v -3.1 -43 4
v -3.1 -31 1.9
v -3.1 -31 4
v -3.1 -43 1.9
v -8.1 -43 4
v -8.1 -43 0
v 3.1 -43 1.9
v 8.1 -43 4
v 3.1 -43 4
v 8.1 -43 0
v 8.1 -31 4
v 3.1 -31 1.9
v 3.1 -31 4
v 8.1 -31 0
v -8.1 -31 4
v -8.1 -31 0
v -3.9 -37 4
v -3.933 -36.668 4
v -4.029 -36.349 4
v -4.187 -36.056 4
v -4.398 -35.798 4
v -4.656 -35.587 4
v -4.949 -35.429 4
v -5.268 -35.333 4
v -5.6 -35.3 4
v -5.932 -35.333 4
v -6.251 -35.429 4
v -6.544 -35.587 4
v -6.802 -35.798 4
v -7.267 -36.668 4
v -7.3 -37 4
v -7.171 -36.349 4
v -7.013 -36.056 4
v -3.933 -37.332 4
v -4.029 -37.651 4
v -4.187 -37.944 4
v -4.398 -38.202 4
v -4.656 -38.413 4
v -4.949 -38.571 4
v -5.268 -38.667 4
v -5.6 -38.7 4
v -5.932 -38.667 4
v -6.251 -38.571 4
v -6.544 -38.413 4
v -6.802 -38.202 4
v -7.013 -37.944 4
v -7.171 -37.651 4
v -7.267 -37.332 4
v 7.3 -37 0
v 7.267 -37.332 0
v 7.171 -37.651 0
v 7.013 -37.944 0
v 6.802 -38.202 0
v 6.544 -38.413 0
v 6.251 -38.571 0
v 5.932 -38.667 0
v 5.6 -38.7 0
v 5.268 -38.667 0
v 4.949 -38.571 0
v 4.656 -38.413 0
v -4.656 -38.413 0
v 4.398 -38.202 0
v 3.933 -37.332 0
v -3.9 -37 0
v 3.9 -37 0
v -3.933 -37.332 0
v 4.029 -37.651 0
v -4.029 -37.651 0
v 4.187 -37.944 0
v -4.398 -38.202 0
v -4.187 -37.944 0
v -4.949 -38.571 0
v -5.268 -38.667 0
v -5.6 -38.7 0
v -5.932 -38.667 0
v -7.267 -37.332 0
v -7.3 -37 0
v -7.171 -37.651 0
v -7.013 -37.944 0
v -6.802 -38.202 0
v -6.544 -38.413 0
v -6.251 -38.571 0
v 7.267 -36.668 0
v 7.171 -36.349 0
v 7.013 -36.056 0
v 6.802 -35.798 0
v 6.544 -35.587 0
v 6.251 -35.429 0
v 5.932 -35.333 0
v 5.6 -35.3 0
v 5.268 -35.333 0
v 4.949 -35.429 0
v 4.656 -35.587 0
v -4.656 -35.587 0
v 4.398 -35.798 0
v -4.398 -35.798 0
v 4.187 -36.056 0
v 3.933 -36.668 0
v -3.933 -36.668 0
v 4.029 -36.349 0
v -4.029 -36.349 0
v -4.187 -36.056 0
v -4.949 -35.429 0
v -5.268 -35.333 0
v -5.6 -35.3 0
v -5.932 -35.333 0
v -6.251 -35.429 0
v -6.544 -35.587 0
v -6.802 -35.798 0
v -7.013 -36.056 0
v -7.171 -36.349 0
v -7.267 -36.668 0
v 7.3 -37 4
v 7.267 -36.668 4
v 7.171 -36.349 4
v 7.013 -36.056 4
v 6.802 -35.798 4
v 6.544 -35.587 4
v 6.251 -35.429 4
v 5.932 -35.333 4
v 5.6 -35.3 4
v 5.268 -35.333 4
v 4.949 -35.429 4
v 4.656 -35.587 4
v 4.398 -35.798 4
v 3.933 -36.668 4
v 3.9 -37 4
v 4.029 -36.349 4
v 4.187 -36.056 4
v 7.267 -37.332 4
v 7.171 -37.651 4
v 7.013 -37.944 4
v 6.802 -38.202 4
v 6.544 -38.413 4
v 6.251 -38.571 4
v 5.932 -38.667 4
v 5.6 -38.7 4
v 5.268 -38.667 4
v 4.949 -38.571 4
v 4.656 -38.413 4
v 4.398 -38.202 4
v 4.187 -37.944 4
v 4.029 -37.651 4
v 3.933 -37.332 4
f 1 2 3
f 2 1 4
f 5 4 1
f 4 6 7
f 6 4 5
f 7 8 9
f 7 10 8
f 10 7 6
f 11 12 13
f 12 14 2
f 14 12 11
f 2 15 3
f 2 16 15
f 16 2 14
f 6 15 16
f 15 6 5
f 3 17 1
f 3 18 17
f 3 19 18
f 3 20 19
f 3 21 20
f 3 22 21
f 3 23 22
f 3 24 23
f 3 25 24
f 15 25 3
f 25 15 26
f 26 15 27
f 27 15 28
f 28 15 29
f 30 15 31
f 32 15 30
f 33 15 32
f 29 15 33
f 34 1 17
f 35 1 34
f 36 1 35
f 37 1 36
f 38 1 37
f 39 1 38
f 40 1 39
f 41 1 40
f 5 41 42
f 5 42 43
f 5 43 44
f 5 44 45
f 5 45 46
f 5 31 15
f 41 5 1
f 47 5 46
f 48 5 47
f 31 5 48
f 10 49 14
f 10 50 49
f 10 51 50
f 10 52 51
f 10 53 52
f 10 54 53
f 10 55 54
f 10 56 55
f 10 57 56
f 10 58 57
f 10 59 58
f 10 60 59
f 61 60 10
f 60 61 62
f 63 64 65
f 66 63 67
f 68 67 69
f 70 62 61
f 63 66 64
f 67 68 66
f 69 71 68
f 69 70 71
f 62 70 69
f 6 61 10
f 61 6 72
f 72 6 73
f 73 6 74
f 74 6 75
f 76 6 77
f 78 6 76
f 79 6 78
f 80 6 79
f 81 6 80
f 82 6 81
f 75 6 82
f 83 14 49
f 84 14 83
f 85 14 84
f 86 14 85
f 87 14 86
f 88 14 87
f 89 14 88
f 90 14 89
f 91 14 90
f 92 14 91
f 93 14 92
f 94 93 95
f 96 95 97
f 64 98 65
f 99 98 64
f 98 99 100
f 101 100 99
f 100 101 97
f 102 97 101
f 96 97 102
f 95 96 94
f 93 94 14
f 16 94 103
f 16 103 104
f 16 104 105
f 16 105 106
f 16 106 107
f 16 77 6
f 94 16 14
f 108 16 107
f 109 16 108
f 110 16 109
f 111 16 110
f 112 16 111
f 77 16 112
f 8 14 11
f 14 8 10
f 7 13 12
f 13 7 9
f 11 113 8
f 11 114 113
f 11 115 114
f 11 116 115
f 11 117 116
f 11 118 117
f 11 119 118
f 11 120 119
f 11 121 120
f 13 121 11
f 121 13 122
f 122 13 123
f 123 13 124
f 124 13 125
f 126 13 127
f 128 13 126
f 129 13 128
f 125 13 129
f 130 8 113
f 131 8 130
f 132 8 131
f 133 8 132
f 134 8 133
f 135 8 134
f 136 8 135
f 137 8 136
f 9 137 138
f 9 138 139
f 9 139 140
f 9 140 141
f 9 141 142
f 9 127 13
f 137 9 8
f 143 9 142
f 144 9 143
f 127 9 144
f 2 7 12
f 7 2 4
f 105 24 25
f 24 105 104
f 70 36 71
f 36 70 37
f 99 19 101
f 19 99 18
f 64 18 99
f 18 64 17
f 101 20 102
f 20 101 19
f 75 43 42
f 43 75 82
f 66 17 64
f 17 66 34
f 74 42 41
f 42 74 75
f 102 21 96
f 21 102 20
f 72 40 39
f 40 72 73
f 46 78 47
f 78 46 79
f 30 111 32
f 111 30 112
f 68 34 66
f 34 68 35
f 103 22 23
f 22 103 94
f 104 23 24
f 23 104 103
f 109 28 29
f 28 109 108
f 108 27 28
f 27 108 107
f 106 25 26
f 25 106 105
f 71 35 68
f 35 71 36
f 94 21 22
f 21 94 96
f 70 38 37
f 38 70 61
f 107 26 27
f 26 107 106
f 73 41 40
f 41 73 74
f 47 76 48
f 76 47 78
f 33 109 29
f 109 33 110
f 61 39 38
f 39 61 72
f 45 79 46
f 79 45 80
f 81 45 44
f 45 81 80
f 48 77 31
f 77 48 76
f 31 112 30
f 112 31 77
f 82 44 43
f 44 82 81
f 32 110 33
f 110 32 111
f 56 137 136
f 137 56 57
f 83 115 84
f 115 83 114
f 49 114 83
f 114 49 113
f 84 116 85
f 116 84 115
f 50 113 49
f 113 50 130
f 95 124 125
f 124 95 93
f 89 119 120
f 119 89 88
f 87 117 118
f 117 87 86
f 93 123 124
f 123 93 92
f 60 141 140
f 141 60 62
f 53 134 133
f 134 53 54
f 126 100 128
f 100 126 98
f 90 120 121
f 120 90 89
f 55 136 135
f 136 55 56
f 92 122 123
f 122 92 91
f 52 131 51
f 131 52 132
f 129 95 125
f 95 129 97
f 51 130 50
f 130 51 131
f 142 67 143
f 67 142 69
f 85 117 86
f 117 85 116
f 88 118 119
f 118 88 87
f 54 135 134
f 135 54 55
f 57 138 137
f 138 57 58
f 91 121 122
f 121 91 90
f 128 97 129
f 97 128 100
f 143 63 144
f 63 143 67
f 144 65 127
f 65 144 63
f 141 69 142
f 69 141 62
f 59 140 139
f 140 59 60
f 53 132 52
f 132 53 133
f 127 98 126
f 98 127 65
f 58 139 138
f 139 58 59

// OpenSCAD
// file: ../port_tower.scad
// ============================================================
//  Female port tower: positioning stage (rotated 180 deg so its
//  payload face looks toward -Y) + bracket plate with the keyed
//  D-hole. The bulkhead goes in from the back (flange behind the
//  plate), nut on the front. Plate front face is at world y=0.
// ============================================================
include <stage.scad>

bracket_w      = 36;
bracket_hole_dz = port_z - stage_payload_z;   // hole above payload centre
bracket_bot    = -zs_h / 2;
bracket_top    = bracket_hole_dz + bh_nut_af / cos(30) / 2 + 3;
rib_t          = 5;     // rib width (X)
rib_d          = 7;     // rib depth (out of the plate front)

// Payload-face coordinates: origin at face centre, +Y away from the stage.
module port_bracket() {
    difference() {
        union() {
            translate([-bracket_w / 2, 0, bracket_bot]) cube([bracket_w, plate_t, bracket_top - bracket_bot]);
            // stiffening ribs, outboard of the nut and clear of the plug clamp
            for (sx = [-1, 1])
                translate([sx > 0 ? bracket_w / 2 - rib_t : -bracket_w / 2, plate_t - 0.01, bracket_bot])
                    hull() {
                        cube([rib_t, rib_d, 1]);
                        translate([0, 0, bracket_hole_dz - 14]) cube([rib_t, 0.01, 1]);
                    }
        }
        // keyed D-hole, flat on top
        translate([0, plate_t, bracket_hole_dz]) rotate([90, 0, 0]) d_hole(t = plate_t);
        // mounting screws into the z-slider's captive nuts
        for (p = payload_pts) translate([p[0], -0.01, p[1]]) rotate([-90, 0, 0]) {
            screw_hole(m3_d, plate_t + rib_d);
        }
    }
}

// Whole tower in world coordinates at fine-travel offset (dx, dz),
// measured in world X / Z.
// Tower B (i=1) is the mirror image so its X adjust screw faces outward.
module port_tower_world(i, dx = 0, dz = 0) {
    ldx = i == 0 ? -dx : dx;   // world dx -> stage-local dx
    translate([tower_x(i), tower_y, 0]) rotate([0, 0, 180]) stage_hand(i == 1) {
        stage_assembly(ldx, dz, base = false); // base is part of the X base
        stage_payload_origin(ldx, dz) show("port_bracket") color("Orange") port_bracket();
    }
}

// Bulkhead connector stand-in (for checks / preview), world coords.
module bulkhead_world(i, dx = 0, dz = 0) {
    translate([port_x[i] + dx, port_face_y, port_z + dz]) rotate([90, 0, 0]) show("bulkhead") color("DimGray") {
        cylinder(d = bh_thread_d, h = bh_thread_len - plate_t);                   // thread + face
        cylinder(d = bh_nut_af / cos(30), h = bh_nut_t, $fn = 6);                  // nut
        translate([0, 0, -plate_t - 2]) cylinder(d = bh_flange_d, h = 2);          // flange
        translate([0, 0, -plate_t - 40]) cylinder(d = 14, h = 38);                 // body
    }
}

echo("CHECK", "port_z", port_z);
// file: ../plug_mount.scad
// ============================================================
//  Male plug mount: flexure (frame + 4 L-beams + floating island with
//  the clamp cradle built in), clamp cap, and two identical stop
//  straps (front + back) whose pins limit X/Z float to +/-flex_float
//  and whose 1 mm standoff limits Y float to +/-flex_stop_gap.
//  Local coords: origin at the stage payload face centre, +Y away from
//  the stage, Z relative to the payload centre.
// ============================================================
include <port_tower.scad>
include <axes.scad>

plug_dz = port_z - (yc_top + stage_payload_z); // plug centre above payload centre
blk_x = plug_bx / 2 + 0.1; // snug in X
blk_y0 = flex_t + clamp_wall; // block back face
blk_y1 = blk_y0 + plug_by; // block front face
blk_z0 = plug_dz + plug_drop; // block bottom
blk_z1 = blk_z0 + plug_block[2];
crad_x = blk_x + 5; // cradle half width
crad_y1 = blk_y1 - 0.4; // cradle stops short: cap clamps the block
cap_back_y = crad_y1;
crad_scr = blk_x + 2.5; // cradle screw X
lip_in = plug_bx / 2 - 0.45; // top lips overlap the block by 0.55 mm
relief_hole_d = 7; // through the lips, centred on the cable

isl_x = 19; // island half width
isl_z0 = blk_z0 - 1;
isl_z1 = isl_z0 + flex_isl_h;
flex_g = 6; // island-to-frame gap
in_x = isl_x + flex_g;
in_z0 = isl_z0 - flex_g;
in_z1 = isl_z1 + flex_g;
fr_bar = 5;
fr_x = in_x + fr_bar;
fr_z0 = -zs_h / 2;
fr_z1 = in_z1 + fr_bar;

pin_d = 4;
pin_z = isl_z1 - 4;
pin_hole = pin_d + 2 * flex_float;
strap_w = 8;
strap_t = 3;
strap_foot_w = 18;
strap_z0 = pin_z - 4;
strap_scr = [-5, 5]; // strap screw X (through the top bar)
strap_scr_z = (in_z1 + fr_z1) / 2;

// one L-beam: island bottom face -> down -> outward -> up -> frame side
leg = 3;
function beam_path(sx, sz) =
  let (
    zc = (isl_z0 + isl_z1) / 2,
    zi = sz < 0 ? isl_z0 : isl_z1,
    zh = zi + sz * leg,
    zv = zc + sz * (flex_g - 2 + 0.5),
    xv = sx * (isl_x + leg)
  ) [[sx * 10, zi], [sx * 10, zh], [xv, zh], [xv, zv], [sx * in_x, zv]];

module poly_beam(pts, w) {
  for (k = [0:len(pts) - 2])
    hull() {
      translate(pts[k]) square(w, center=true);
      translate(pts[k + 1]) square(w, center=true);
    }
}

// XZ outline helpers: 2D (x, z) extruded along +Y from y0, thickness t
module xz_extrude(y0, t, convexity=4) { translate([0, y0 + t, 0]) rotate([90, 0, 0]) linear_extrude(height=t, convexity=convexity) children(); }

module plug_flexure() {
  difference() {
    union() {
      xz_extrude(0, flex_t) {
        difference() {
          translate([-fr_x, fr_z0]) square([2 * fr_x, fr_z1 - fr_z0]);
          translate([-in_x, in_z0]) square([2 * in_x, in_z1 - in_z0]);
        }
        translate([-isl_x, isl_z0]) square([2 * isl_x, isl_z1 - isl_z0]);
        for (sx = [-1, 1], sz = [-1, 1]) poly_beam(beam_path(sx, sz), flex_beam_w);
      }
      // clamp cradle on the island front: back wall + side walls
      translate([-crad_x, flex_t - 0.01, blk_z0]) cube([2 * crad_x, clamp_wall + 0.01, plug_block[2]]);
      for (sx = [-1, 1])
        translate([sx > 0 ? blk_x : -crad_x, blk_y0 - 0.01, blk_z0])
          cube([crad_x - blk_x, crad_y1 - blk_y0 + 0.01, plug_block[2]]);
      // Z retention: lips over the block's top corners, leaving a slot for
      // the cable. Nothing under the block: the plug's bent body hangs below.
      for (sx = [-1, 1])
        translate([sx > 0 ? lip_in : -crad_x, blk_y0 - 0.01, blk_z1])
          cube([crad_x - lip_in, crad_y1 - blk_y0 + 0.01, 1.5]);
    }
    // hole through the top lips for the cable strain relief (the plug goes
    // in from below)
    translate([0, blk_y0 + plug_by / 2, blk_z1 - 0.01]) cylinder(d=relief_hole_d, h=1.5 + 0.02);
    // payload screws into the stage z-slider
    for (p = payload_pts) translate([p[0], -0.5, p[1]]) rotate([-90, 0, 0]) screw_hole(m3_d, flex_t + 1);
    // stop-pin hole (through) and strap screws (through the top bar)
    translate([0, -0.5, pin_z]) rotate([-90, 0, 0]) screw_hole(pin_hole, flex_t + 1);
    for (x = strap_scr) translate([x, -0.5, strap_scr_z]) rotate([-90, 0, 0]) screw_hole(m3_d, flex_t + 1);
    // cap screws, tapped into the cradle side walls
    for (sx = [-1, 1])
      translate([sx * crad_scr, crad_y1 + 0.01, (blk_z0 + blk_z1) / 2])
        rotate([90, 0, 0]) screw_hole(m3_tap, crad_y1 - flex_t + 1);
  }
}

// Clamp cap: 1.5 mm over the block, thicker over the screws.
module plug_clamp_cap() {
  // flat back at the cradle front: squeezes the block (it stands 0.4 proud)
  difference() {
    union() {
      translate([-crad_x, cap_back_y, blk_z0]) cube([2 * crad_x, blk_y1 - cap_back_y + clamp_lip_t, plug_block[2]]);
      for (sx = [-1, 1])
        translate([sx > 0 ? blk_x : -crad_x, cap_back_y, blk_z0])
          cube([crad_x - blk_x, 4, plug_block[2]]);
    }
    for (sx = [-1, 1])
      translate([sx * crad_scr, cap_back_y - 0.01, (blk_z0 + blk_z1) / 2])
        rotate([-90, 0, 0]) screw_hole(m3_d, 5);
  }
}

// Stop strap in its own frame: back face on y=0, pin toward -Y.
module plug_flex_stop() {
  difference() {
    union() {
      translate([-strap_w / 2, 0, strap_z0]) cube([strap_w, strap_t, fr_z1 - strap_z0]);
      translate([-strap_foot_w / 2, -flex_stop_gap, in_z1]) cube([strap_foot_w, strap_t + flex_stop_gap, fr_z1 - in_z1]);
      translate([0, 0.01, pin_z]) rotate([90, 0, 0]) cylinder(d=pin_d, h=flex_stop_gap + 2);
    }
    for (x = strap_scr)
      translate([x, -flex_stop_gap - 0.5, strap_scr_z]) rotate([-90, 0, 0])
          screw_hole(m3_d, strap_t + flex_stop_gap + 1);
  }
}

module plug_flex_stops_placed() {
  translate([0, flex_t + flex_stop_gap, 0]) plug_flex_stop(); // front
  translate([0, -flex_stop_gap, 0]) mirror([0, 1, 0]) plug_flex_stop(); // back
}

// The plug, as separate pieces so a slide-in path can be swept piecewise:
// each piece is hulled with a copy moved by the vector sweep.
module plug_body_pieces(sweep = [0, 0, 0], relief = true) {
  module sw() { hull() { children(); translate(sweep) children(); } }
  sw() translate([-plug_bx / 2, blk_y0, blk_z0]) cube([plug_bx, plug_by, plug_block[2]]);
  if (relief) sw() translate([0, blk_y0 + plug_by / 2, blk_z1]) cylinder(d=plug_cable_d, h=15); // cable strain relief
  sw() hull() {
    translate([-plug_bx / 2, blk_y0, plug_dz - 4]) cube([plug_bx, plug_by, blk_z0 - plug_dz + 4]);
    translate([0, blk_y1 + plug_head_proj - 1, plug_dz]) rotate([-90, 0, 0]) cylinder(d=8, h=1);
  }
}
module plug_body_local() { show("usb_plug") color("White") plug_body_pieces(); }

// Everything that moves with the plug carriage, minus the plug itself.
module plug_mount_world(x_pos, y_pos, dx = 0, dz = 0) {
  o = ms_origin(x_pos, y_pos);
  translate(o) {
    stage_assembly(dx, dz, base = false); // base is part of the Y carriage
    stage_payload_origin(dx, dz) {
      show("plug_flexure") color("Orange") plug_flexure();
      show("plug_clamp_cap") color("Gold") plug_clamp_cap();
      show("plug_flex_stop") color("Khaki") plug_flex_stops_placed();
    }
  }
}
module plug_body_world(x_pos, y_pos, dx = 0, dz = 0) {
  o = ms_origin(x_pos, y_pos);
  translate(o) stage_payload_origin(dx, dz) plug_body_local();
}

// ---- checks ----
echo("CHECK", "clamp_lip_t", clamp_lip_t);
echo("CHECK", "clamp_preload", blk_y1 - cap_back_y);
echo("CHECK", "clamp_x_play", blk_x - plug_bx / 2);
echo("CHECK", "pillar_above_flex", pillar_top - (yc_top + stage_payload_z + fr_z1));
echo("CHECK", "clamp_bottom_above_plug", blk_z0 - plug_dz);
echo("CHECK", "clamp_lip_overlap", blk_x - lip_in);
// lip left over the block in front of / behind the relief hole (Y)
echo("CHECK", "lip_hold_y", (plug_by - relief_hole_d) / 2);
echo(
  "CHECK", "plug_insert_err",
  (ms_origin(0, y_travel)[1] + payload_face_y + blk_y1 + plug_head_proj) - bh_face_y
);
echo("CHECK", "flex_xz_stop", (pin_hole - pin_d) / 2);
// beam-to-island and beam-to-frame clearance must exceed the stop travel
echo("CHECK", "flex_beam_clear", leg - flex_beam_w / 2);
// main file
// Clamp cap: squeezes the plug block into the cradle with 2x M3x10
// self-tappers. Qty 1. Print on its flat back face.
include <../plug_mount.scad>
rotate([90, 0, 0]) translate([0, -cap_back_y, 0]) plug_clamp_cap();
